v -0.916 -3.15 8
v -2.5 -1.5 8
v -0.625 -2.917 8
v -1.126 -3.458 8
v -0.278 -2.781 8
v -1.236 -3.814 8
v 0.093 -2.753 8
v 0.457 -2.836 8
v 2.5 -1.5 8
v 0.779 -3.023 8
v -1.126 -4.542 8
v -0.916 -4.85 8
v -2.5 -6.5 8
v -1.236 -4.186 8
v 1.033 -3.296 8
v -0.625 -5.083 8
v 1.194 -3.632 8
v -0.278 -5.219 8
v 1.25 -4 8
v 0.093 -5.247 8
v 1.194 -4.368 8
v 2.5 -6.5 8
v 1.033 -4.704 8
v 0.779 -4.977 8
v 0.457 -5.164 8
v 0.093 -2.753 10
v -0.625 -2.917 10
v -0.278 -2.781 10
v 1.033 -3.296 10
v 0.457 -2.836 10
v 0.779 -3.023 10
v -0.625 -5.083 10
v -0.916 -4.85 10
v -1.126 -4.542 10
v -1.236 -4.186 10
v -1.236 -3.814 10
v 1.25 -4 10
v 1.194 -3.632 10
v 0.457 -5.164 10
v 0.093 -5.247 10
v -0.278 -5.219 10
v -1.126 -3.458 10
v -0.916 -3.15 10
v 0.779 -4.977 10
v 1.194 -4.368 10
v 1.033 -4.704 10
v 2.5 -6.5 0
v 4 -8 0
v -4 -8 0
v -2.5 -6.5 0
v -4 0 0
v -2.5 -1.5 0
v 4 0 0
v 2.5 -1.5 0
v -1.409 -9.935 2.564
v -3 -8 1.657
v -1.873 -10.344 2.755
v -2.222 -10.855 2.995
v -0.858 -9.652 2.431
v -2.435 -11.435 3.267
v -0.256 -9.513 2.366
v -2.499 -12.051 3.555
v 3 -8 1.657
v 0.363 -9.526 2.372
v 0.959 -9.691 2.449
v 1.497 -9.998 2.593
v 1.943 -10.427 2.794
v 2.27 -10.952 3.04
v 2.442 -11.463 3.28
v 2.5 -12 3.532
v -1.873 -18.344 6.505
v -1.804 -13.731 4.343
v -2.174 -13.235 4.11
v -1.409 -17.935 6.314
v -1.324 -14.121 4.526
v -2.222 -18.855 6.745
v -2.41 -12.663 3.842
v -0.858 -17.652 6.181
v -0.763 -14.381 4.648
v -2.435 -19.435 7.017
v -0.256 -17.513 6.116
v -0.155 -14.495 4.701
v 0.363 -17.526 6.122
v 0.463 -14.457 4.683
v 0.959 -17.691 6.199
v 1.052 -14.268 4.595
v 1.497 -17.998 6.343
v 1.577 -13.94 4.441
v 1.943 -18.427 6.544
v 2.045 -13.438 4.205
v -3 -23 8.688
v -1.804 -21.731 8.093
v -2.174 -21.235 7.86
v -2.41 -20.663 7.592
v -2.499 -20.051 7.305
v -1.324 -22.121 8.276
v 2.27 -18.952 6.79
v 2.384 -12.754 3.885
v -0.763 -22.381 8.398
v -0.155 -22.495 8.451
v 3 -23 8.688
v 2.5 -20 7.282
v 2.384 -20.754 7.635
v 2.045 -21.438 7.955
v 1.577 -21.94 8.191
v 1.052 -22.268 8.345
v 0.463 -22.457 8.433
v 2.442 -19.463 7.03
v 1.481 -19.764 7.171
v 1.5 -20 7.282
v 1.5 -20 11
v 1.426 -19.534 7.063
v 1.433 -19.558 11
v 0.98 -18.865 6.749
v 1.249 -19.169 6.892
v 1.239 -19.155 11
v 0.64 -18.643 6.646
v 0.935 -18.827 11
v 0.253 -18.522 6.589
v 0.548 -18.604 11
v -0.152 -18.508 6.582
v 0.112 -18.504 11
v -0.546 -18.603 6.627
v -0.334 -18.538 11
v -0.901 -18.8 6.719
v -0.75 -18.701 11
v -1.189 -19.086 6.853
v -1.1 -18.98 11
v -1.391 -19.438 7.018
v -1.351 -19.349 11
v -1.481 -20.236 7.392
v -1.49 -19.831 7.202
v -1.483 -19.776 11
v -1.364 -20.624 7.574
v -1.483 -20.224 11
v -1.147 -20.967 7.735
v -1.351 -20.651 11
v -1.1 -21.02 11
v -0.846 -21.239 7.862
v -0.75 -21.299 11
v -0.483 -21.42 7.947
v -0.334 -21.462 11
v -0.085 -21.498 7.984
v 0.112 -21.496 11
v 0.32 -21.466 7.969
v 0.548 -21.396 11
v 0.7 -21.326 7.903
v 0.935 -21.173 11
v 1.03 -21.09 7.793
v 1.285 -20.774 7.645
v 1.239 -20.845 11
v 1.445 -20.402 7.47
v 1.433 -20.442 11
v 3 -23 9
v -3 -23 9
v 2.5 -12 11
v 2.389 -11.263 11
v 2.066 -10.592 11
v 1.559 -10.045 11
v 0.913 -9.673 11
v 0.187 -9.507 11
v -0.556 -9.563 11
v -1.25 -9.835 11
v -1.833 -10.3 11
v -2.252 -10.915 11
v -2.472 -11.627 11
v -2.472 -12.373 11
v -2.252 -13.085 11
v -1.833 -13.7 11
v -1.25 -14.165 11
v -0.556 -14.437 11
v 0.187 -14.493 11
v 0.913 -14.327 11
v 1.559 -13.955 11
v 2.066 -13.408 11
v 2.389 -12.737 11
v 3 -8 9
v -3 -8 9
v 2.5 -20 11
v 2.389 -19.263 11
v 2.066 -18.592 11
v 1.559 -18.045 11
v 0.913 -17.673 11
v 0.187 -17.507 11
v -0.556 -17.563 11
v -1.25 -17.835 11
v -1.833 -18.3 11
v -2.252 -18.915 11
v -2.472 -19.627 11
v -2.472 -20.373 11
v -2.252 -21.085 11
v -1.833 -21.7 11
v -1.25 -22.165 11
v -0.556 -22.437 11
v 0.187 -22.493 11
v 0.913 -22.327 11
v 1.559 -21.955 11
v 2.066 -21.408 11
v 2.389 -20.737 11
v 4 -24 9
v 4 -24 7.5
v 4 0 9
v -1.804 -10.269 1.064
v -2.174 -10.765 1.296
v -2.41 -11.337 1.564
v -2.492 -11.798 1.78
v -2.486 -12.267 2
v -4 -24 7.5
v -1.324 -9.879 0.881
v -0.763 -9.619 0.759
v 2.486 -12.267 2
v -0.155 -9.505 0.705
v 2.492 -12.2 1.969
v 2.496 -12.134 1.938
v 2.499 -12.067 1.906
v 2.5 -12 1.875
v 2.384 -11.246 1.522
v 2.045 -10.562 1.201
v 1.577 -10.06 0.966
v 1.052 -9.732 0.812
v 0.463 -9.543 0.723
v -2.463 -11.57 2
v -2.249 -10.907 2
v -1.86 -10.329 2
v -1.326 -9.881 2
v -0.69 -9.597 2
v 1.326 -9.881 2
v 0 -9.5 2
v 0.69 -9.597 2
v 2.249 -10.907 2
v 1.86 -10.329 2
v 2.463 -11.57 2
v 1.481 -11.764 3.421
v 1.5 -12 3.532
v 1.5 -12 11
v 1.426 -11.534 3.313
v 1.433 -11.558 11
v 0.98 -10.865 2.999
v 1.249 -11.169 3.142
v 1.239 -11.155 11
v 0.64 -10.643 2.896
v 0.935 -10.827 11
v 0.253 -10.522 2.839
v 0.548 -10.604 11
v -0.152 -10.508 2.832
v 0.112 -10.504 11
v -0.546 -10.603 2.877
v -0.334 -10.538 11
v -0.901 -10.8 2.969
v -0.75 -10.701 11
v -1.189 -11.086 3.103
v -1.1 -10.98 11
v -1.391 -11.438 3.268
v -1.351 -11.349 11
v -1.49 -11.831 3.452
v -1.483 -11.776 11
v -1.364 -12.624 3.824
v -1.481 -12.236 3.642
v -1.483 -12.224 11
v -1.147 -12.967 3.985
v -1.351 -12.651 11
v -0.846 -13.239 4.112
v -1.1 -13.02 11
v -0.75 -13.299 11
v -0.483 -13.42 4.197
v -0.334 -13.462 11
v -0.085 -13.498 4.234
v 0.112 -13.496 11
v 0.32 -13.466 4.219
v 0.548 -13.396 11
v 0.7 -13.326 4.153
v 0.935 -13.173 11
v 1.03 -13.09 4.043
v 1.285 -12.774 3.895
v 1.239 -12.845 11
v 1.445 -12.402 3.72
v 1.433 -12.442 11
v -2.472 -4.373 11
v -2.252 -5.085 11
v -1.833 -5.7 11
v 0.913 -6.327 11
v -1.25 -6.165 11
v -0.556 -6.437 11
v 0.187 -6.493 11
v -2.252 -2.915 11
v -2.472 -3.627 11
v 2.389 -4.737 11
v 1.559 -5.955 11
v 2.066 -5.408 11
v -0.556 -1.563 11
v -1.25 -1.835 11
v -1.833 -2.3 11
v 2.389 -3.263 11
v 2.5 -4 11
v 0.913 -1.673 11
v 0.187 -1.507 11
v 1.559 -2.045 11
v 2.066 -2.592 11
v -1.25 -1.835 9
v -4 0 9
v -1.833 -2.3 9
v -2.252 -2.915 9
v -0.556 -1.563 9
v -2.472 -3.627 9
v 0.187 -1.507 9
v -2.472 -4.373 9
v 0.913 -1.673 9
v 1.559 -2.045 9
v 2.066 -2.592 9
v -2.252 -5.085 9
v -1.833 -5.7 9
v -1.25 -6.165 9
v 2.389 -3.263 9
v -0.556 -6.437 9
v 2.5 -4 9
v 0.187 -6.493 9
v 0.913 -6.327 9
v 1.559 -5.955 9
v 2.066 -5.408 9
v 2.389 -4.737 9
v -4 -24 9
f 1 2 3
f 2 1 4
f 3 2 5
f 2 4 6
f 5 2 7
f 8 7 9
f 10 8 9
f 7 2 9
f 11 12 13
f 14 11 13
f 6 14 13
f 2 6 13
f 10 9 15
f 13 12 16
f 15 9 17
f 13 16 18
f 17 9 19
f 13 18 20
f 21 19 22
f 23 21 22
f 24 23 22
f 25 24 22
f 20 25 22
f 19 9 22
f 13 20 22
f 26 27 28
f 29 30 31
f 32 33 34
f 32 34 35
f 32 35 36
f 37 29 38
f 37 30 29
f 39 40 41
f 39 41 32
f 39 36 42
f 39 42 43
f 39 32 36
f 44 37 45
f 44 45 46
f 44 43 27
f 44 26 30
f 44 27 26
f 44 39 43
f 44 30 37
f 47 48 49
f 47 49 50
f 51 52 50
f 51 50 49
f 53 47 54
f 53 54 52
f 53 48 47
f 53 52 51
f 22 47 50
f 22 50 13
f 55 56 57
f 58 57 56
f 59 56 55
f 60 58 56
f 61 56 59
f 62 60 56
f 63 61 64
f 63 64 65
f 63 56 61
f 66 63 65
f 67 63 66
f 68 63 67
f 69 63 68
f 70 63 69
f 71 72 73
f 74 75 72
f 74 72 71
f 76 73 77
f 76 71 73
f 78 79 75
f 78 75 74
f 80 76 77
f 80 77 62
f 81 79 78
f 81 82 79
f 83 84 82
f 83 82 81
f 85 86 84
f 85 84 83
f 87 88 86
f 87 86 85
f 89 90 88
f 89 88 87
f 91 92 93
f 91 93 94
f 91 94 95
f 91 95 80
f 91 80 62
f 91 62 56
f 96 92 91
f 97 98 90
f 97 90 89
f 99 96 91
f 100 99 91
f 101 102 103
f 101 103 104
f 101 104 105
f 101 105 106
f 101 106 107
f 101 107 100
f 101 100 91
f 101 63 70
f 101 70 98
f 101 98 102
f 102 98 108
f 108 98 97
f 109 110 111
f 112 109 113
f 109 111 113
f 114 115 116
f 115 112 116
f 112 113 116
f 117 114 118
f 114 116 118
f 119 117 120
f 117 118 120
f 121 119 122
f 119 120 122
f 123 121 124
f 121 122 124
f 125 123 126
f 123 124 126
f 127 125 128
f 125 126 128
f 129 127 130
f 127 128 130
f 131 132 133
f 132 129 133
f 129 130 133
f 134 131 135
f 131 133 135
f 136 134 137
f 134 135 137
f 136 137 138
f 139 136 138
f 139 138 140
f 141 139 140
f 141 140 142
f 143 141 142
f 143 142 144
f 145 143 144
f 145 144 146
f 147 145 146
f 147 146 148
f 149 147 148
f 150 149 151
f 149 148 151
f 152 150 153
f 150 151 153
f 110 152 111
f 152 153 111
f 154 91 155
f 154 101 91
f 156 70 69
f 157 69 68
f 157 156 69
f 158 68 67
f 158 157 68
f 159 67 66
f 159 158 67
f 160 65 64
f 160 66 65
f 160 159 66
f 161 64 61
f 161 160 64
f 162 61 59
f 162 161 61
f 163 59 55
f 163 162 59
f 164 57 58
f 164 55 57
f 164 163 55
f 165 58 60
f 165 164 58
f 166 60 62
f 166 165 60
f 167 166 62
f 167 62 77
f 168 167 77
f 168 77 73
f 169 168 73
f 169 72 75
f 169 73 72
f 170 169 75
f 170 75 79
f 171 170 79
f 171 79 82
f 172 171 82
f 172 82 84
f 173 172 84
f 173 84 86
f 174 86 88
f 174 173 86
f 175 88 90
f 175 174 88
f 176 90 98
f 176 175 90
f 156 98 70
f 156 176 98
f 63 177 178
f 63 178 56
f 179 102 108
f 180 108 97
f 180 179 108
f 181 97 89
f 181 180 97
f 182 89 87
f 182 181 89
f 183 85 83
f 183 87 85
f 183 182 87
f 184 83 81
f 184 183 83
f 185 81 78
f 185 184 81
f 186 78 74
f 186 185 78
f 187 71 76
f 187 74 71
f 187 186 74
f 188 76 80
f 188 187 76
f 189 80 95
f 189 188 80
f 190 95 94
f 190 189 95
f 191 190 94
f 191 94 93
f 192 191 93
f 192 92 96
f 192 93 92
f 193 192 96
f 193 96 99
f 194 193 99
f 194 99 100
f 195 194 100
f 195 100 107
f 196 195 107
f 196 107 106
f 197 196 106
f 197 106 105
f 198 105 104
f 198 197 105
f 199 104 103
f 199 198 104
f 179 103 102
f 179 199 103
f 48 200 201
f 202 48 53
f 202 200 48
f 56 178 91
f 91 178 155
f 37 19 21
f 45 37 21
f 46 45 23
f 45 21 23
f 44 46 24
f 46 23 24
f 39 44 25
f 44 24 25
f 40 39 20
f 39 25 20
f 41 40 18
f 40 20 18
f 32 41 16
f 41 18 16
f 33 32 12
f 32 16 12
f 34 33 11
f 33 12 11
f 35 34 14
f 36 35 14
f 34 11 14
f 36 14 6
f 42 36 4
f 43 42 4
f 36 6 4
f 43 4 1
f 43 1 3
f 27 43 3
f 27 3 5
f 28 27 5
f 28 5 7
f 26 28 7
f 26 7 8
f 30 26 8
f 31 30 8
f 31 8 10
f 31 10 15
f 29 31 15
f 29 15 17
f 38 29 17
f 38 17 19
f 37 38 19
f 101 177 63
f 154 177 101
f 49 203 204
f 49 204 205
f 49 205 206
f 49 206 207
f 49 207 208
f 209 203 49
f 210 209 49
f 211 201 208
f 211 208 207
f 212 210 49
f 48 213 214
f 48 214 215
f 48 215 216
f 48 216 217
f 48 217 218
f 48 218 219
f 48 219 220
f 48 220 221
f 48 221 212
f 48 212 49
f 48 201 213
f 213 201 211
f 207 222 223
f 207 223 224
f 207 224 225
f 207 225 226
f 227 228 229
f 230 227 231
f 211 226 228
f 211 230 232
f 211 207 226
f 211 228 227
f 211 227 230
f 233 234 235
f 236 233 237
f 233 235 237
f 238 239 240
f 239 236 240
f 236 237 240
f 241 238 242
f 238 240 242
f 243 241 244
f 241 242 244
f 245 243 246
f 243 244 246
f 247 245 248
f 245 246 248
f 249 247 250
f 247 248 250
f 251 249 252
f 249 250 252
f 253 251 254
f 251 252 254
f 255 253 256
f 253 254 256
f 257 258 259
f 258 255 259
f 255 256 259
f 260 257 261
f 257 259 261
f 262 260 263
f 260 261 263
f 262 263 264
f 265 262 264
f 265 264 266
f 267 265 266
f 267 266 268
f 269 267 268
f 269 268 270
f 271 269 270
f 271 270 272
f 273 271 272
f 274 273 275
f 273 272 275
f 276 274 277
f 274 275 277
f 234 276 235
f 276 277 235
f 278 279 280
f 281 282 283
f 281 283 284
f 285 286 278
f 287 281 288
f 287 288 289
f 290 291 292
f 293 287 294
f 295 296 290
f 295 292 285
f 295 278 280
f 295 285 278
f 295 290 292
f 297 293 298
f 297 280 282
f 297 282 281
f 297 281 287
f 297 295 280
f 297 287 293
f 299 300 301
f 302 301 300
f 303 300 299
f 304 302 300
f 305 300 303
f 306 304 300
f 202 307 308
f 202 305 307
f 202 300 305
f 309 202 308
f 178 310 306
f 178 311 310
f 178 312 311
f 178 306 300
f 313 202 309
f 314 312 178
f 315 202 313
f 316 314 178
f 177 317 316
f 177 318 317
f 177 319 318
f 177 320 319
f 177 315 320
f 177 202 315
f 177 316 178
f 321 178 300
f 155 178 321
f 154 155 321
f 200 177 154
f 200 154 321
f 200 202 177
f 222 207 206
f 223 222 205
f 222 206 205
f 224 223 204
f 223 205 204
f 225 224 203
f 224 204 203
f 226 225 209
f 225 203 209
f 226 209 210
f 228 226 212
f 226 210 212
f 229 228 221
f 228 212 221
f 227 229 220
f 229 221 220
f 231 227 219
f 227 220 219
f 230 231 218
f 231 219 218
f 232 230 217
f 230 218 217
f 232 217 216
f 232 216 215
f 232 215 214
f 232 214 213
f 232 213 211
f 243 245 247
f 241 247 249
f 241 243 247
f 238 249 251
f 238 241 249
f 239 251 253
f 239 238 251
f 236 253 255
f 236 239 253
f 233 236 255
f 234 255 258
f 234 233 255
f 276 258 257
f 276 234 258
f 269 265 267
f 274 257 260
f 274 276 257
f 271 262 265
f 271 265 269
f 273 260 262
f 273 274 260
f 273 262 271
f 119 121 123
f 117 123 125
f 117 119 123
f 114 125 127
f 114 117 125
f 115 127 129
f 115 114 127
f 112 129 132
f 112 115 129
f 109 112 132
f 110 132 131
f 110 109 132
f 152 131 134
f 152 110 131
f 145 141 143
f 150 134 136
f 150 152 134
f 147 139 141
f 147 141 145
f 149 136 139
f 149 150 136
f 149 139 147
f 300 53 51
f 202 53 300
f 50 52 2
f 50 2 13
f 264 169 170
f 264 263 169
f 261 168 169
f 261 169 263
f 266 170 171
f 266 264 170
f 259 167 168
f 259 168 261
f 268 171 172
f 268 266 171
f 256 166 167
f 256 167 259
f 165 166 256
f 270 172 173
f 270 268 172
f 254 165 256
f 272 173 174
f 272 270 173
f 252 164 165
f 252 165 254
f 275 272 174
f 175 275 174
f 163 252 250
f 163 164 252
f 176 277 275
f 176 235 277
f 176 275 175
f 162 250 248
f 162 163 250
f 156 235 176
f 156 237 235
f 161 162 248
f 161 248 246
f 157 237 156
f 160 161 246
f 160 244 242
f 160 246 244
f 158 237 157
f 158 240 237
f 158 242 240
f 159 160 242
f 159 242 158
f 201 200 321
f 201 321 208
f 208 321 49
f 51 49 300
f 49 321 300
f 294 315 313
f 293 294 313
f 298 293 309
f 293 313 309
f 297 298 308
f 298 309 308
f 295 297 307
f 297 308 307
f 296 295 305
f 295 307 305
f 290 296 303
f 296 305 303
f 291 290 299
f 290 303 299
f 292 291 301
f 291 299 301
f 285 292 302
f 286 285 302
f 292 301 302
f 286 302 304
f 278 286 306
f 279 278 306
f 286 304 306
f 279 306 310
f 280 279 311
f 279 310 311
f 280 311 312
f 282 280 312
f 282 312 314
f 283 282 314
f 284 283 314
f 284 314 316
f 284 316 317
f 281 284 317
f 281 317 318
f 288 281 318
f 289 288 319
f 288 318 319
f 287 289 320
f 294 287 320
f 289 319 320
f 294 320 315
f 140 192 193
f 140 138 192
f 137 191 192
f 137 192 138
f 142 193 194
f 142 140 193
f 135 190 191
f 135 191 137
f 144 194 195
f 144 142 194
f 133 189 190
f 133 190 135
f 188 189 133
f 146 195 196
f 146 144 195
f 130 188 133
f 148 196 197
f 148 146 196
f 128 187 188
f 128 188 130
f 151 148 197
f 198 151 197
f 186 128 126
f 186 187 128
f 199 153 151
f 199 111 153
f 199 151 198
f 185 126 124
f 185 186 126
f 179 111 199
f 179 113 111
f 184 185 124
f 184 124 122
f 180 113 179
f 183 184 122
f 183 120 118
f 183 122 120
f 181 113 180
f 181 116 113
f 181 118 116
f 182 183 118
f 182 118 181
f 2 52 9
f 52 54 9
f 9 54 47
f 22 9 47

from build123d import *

# Parameters (mm, degrees)
F1_DEPTH  = 4
F3_DEPTH  = 3
F2_W      = 5
F2_H      = 8
F4_DEPTH  = 2.5
F6_R      = 2.5
F7_DEPTH  = 2
F8_R      = 1.25
F9_DEPTH  = 10
F10_R     = 2.5
F10_R_2   = 1.5
F12_R     = 2.5
F13_DEPTH = 2


with BuildPart() as f1:
    # F0 (on Right) → F1 (new body)
    with BuildSketch(Plane.YZ):
        Polygon((-8, 0), (0, 0), (0, 9), (-24, 9), (-24, 7.5), align=None)
    extrude(amount=F1_DEPTH)

    # F2 (on face) → F3 (cut)
    with BuildSketch(Plane(origin=(0, 0, 0), x_dir=(0, -1, 0), z_dir=(-1, 0, 0))):
        Polygon((23, 9), (8, 9), (8, 1.6566184732), (23, 8.6878684732), align=None)
    extrude(amount=-F3_DEPTH, mode=Mode.SUBTRACT)

    # F2 (on face) → F4 (cut)
    with BuildSketch(Plane(origin=(0, 0, 0), x_dir=(0, -1, 0), z_dir=(-1, 0, 0))):
        with Locations((4, 4)):
            Rectangle(F2_W, F2_H)
    extrude(amount=-F4_DEPTH, mode=Mode.SUBTRACT)

    # F5: F1 across face


with BuildPart() as f1_1:
    add(f1.part)
    add(f1.part.mirror(Plane(origin=(0, -9.4545581434, 4.8825876623), x_dir=(0, 1, 0), z_dir=(-1, 0, 0))))

    # F6 (on face) → F7 (join)
    with BuildSketch(Plane.XY.offset(9)):
        with Locations((0, -4)):
            Circle(F6_R)
    extrude(amount=F7_DEPTH)

    # F8 (on face) → F9 (cut)
    with BuildSketch(Plane(origin=(0, 0, 0), x_dir=(1, 0, 0), z_dir=(0, 0, -1))):
        with Locations((0, 4)):
            Circle(F8_R)
    extrude(amount=-F9_DEPTH, mode=Mode.SUBTRACT)

    # F10 (on face) → F11 (join, up to the next surface of F1)
    with BuildSketch(Plane.XY.offset(11)):
        with Locations((0, -12)):
            Circle(F10_R)
        with Locations((0, -12)):
            Circle(F10_R_2, mode=Mode.SUBTRACT)
        with Locations((0, -20)):
            Circle(F10_R)
        with Locations((0, -20)):
            Circle(F10_R_2, mode=Mode.SUBTRACT)
    extrude(until=Until.NEXT, dir=(0, 0, -1))

    # F12 (on face) → F13 (cut)
    with BuildSketch(Plane(origin=(0, 0, 0), x_dir=(1, 0, 0), z_dir=(0, 0, -1))):
        with Locations((0, 12)):
            Circle(F12_R)
    extrude(amount=-F13_DEPTH, mode=Mode.SUBTRACT)


solid = f1_1.part
